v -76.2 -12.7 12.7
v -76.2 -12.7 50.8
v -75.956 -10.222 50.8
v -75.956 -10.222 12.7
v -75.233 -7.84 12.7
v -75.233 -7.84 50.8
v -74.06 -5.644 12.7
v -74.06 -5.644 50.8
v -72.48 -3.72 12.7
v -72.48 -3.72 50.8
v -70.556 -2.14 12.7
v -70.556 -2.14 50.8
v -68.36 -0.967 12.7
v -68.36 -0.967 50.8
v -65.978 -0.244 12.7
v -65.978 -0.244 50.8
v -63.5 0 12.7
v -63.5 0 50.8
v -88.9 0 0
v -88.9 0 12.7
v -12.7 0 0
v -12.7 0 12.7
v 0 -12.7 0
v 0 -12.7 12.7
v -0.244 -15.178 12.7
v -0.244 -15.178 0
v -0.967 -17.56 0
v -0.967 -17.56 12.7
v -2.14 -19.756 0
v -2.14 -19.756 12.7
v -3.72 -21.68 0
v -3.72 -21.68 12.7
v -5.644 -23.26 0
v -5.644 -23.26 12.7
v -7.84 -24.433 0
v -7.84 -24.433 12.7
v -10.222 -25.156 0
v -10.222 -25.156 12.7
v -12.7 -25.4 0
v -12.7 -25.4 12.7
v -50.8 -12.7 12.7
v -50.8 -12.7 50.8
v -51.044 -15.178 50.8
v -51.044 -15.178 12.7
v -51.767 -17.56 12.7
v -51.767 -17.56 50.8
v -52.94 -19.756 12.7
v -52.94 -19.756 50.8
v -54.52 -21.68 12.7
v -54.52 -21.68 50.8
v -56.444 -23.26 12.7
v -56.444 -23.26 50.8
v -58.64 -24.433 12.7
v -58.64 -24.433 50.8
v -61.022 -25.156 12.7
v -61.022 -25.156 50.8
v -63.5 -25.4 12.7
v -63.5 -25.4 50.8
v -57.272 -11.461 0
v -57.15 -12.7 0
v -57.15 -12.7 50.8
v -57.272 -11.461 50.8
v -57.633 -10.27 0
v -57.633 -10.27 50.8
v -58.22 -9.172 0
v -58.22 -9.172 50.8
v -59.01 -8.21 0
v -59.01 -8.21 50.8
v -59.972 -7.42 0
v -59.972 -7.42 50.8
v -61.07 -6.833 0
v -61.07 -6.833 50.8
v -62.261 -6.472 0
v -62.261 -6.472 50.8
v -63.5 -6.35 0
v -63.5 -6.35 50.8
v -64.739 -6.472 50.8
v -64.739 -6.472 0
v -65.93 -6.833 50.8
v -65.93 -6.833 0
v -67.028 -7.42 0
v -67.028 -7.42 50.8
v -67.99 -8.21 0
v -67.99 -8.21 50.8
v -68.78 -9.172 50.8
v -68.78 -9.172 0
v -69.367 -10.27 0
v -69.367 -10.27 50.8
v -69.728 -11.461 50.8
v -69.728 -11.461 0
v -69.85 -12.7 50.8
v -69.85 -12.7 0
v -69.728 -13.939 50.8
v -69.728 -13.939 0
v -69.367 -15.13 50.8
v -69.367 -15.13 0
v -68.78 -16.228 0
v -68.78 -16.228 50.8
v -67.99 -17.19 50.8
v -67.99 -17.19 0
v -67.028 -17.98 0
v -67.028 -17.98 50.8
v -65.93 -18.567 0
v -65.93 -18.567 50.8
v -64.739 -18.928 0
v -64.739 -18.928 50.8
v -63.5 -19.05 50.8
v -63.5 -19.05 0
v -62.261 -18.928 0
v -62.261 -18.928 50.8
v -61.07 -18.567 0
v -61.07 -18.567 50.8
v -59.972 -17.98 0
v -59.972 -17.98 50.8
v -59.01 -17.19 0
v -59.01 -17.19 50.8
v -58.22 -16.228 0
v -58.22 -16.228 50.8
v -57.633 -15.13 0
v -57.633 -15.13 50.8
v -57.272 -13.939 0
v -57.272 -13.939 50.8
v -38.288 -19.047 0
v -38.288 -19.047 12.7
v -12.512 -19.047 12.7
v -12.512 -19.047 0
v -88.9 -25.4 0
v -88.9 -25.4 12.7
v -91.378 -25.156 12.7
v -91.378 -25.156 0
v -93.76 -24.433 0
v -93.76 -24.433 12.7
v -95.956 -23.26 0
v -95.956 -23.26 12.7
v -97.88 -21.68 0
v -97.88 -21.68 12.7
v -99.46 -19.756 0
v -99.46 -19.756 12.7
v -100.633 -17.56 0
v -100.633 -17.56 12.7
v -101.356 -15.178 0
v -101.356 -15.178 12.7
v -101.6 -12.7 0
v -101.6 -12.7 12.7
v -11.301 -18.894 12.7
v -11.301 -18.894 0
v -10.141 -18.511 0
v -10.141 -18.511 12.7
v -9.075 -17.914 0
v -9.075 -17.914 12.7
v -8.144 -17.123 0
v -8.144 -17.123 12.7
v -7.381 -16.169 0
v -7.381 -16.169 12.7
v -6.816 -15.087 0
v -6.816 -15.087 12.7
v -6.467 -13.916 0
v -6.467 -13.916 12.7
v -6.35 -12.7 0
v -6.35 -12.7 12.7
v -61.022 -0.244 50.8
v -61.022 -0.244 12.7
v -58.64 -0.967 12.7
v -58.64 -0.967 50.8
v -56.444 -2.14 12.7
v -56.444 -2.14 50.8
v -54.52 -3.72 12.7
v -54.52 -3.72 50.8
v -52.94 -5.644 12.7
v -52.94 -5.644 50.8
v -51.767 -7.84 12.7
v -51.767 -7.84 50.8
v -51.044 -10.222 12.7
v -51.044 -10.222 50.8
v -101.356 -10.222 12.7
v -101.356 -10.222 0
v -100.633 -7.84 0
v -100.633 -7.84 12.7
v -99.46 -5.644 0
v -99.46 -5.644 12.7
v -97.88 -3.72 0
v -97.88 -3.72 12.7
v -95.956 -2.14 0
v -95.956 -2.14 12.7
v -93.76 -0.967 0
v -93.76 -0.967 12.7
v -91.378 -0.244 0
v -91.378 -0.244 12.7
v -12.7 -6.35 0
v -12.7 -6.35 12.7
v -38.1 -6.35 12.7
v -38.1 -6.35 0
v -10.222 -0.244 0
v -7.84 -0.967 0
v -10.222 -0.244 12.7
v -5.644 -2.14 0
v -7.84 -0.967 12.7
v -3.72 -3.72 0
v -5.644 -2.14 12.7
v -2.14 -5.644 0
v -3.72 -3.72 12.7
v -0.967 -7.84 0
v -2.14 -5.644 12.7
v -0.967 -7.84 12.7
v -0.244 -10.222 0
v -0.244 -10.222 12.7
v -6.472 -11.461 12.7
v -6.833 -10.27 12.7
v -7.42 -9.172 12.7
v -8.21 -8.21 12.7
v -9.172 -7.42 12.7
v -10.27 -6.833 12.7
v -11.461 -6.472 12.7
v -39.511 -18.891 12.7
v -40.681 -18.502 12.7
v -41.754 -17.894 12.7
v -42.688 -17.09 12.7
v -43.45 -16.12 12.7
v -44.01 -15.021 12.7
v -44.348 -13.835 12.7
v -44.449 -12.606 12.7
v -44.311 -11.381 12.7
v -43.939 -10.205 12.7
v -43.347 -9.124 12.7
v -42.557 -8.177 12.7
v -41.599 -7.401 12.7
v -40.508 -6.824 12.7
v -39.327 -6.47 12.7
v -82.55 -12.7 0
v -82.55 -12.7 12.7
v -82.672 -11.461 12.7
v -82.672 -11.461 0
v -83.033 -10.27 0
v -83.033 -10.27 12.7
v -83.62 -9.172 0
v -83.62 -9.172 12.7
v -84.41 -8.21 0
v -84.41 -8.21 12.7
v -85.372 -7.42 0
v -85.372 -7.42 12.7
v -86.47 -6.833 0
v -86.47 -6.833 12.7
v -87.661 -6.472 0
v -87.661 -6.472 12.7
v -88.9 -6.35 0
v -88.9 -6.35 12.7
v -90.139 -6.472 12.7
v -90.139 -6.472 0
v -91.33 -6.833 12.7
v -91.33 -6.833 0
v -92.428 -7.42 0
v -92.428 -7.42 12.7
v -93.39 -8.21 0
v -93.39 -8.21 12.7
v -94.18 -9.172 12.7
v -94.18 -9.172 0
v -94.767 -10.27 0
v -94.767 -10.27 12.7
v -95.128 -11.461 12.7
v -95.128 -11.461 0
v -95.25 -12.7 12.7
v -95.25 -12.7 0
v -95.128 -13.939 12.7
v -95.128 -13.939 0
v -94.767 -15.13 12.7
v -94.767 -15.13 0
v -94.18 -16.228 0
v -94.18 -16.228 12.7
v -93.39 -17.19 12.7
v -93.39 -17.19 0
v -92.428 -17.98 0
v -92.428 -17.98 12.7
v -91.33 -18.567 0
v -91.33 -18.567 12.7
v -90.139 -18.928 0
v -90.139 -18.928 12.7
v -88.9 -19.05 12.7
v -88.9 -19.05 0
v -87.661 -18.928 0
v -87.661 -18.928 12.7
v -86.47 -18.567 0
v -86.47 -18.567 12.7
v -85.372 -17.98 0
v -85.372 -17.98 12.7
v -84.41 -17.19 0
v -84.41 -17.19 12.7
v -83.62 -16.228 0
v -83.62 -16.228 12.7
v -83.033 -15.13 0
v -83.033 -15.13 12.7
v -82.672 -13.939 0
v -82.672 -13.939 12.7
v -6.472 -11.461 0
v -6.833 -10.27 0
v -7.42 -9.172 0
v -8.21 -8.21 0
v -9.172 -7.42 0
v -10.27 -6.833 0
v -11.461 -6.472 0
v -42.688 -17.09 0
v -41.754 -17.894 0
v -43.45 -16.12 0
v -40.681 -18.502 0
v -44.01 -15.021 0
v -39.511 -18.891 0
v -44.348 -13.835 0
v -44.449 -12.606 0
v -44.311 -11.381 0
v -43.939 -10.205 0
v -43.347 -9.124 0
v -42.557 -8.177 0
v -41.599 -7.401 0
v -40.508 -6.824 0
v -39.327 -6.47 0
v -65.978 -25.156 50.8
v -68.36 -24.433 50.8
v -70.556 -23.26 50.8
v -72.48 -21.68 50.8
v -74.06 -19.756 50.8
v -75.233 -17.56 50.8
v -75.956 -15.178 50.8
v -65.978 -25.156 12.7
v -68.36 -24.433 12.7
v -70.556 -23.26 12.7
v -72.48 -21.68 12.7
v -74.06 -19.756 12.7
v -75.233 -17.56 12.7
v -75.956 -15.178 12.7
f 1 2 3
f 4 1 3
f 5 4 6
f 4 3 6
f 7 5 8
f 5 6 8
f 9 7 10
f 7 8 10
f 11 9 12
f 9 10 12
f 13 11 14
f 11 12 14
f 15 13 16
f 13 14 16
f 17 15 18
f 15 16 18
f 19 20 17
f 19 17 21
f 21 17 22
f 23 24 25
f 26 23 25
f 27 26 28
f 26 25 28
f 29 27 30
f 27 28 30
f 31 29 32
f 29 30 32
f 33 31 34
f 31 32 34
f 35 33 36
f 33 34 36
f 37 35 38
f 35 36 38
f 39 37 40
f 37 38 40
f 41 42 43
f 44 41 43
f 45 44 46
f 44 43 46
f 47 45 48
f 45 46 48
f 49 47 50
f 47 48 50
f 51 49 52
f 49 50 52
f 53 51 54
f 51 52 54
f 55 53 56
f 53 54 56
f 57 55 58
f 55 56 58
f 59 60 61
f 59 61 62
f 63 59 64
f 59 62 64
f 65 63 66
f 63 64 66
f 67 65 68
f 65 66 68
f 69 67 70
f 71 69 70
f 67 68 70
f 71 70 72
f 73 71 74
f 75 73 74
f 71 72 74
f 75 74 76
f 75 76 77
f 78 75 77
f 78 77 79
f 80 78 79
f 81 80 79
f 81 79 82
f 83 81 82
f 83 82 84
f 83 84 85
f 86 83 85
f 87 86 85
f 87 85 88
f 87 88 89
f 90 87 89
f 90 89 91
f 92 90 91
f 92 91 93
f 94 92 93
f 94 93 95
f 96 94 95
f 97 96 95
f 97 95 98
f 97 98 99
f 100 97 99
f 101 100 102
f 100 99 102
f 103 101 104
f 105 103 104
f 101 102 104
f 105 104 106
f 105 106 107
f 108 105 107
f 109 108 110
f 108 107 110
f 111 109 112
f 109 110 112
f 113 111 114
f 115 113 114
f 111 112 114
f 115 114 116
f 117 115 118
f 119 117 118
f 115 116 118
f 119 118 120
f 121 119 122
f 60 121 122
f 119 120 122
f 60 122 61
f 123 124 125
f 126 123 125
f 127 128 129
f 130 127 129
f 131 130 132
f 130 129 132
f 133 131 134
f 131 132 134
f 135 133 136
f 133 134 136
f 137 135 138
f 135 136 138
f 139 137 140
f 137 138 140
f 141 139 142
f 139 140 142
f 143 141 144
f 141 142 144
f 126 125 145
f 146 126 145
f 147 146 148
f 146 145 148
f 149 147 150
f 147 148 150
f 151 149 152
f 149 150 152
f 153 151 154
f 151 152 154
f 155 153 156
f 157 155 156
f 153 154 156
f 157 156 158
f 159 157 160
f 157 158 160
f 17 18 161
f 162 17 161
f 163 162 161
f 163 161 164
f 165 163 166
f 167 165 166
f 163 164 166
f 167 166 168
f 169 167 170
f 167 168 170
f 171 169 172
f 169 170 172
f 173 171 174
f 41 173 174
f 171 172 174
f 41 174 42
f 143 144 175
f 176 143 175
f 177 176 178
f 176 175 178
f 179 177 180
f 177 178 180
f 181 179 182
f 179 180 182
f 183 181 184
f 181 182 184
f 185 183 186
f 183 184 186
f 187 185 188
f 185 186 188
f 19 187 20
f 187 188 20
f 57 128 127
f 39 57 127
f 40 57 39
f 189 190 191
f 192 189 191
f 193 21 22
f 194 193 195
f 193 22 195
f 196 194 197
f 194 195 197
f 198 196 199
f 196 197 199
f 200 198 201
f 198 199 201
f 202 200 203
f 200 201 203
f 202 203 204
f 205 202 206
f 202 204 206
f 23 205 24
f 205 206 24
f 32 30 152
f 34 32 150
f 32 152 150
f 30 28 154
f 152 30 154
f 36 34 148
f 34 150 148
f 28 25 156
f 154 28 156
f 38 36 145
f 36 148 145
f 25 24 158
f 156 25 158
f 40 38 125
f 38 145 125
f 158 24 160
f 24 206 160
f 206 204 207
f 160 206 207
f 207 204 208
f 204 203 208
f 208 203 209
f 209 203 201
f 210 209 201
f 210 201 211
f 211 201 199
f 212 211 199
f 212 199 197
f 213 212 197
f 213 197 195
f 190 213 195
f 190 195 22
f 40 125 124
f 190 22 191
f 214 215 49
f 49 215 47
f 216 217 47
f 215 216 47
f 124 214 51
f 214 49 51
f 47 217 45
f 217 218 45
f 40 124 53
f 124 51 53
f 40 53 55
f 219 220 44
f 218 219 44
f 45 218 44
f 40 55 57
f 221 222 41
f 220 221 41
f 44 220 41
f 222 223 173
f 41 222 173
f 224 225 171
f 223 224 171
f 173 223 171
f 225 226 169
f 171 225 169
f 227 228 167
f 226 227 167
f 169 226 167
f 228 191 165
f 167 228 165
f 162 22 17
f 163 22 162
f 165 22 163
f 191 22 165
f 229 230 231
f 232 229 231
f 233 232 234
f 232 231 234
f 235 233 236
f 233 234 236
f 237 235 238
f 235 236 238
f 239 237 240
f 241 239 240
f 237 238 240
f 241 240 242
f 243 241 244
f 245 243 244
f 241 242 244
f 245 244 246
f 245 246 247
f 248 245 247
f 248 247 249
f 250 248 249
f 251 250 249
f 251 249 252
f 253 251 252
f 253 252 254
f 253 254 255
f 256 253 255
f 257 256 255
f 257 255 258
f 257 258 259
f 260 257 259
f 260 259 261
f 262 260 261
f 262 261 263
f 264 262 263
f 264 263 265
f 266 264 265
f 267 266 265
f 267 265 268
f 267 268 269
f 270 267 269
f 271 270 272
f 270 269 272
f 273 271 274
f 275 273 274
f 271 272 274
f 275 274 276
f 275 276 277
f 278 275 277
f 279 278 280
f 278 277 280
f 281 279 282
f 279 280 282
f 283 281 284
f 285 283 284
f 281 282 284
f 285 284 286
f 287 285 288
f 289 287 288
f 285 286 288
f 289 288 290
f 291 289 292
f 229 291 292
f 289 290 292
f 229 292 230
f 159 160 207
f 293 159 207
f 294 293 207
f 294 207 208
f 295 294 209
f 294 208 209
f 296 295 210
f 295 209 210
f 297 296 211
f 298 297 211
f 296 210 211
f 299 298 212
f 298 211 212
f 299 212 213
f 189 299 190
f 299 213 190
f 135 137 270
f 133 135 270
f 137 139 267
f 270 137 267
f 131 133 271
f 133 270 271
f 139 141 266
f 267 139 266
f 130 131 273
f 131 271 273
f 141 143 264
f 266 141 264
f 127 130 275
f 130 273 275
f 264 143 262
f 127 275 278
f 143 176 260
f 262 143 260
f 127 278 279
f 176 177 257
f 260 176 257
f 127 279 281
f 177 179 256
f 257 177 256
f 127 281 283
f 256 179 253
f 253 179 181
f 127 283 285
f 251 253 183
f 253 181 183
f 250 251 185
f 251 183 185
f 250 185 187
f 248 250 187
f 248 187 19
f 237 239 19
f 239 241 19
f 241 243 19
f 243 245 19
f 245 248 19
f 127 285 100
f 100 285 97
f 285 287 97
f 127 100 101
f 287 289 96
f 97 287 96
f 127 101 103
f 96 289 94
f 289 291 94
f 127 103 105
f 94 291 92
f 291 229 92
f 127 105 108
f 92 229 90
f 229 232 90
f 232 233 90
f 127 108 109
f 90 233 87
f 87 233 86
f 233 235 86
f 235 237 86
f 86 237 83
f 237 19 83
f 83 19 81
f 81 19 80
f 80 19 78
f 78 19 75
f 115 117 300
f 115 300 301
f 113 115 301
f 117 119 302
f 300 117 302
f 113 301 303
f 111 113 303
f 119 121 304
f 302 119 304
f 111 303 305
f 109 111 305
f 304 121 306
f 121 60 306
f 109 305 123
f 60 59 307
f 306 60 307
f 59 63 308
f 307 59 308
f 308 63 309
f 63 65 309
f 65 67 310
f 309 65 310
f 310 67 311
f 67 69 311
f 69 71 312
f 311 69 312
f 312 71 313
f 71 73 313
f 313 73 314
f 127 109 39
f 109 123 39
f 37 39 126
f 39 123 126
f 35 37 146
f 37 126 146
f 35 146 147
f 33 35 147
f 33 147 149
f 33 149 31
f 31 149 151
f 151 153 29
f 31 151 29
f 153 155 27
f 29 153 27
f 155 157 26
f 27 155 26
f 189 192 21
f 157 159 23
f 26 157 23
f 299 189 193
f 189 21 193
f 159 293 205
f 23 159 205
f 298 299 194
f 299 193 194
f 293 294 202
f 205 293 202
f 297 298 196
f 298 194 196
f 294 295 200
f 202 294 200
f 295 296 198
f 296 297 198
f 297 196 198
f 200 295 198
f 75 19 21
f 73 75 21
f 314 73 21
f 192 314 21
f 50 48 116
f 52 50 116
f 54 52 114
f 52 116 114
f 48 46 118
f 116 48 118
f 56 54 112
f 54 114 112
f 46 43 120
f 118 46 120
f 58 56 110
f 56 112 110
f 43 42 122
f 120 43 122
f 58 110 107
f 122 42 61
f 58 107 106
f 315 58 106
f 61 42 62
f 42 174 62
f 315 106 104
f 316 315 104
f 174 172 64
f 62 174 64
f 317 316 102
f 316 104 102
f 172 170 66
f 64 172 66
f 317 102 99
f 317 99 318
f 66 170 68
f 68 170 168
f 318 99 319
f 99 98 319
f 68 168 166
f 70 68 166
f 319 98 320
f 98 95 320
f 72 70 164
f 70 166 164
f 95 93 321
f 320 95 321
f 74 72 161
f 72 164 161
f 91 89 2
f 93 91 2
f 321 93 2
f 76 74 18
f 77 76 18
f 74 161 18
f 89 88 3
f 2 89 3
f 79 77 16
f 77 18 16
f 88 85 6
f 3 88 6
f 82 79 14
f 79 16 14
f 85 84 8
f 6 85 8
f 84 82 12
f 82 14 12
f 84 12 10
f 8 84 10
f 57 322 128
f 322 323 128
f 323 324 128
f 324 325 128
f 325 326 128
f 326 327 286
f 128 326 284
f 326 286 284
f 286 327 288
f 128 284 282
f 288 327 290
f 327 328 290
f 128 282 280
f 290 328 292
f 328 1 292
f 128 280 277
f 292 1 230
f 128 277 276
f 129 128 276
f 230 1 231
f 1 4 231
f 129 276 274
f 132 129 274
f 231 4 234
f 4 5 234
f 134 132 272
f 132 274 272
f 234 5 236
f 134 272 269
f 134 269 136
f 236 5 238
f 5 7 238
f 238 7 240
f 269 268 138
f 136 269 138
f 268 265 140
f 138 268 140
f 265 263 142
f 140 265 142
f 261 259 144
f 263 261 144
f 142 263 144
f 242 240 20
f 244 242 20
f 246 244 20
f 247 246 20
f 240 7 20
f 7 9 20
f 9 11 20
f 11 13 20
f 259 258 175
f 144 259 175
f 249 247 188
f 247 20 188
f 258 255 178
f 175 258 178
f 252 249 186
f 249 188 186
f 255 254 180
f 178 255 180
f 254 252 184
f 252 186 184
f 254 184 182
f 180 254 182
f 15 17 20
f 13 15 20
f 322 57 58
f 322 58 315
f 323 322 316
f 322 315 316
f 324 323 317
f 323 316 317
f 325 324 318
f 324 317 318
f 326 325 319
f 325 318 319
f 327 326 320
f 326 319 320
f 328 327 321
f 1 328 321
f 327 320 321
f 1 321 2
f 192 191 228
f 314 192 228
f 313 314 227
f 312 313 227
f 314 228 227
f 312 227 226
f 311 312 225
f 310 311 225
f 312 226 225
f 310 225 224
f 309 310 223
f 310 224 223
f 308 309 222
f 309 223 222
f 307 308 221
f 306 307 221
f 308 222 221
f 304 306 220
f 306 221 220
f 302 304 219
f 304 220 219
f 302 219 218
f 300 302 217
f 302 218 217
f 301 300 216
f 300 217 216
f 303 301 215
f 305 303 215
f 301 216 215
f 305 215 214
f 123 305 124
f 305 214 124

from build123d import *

# Parameters (mm, degrees)
F1_DEPTH  = 25.4
F3_DEPTH  = 38.1
F4_R      = 6.35
F5_DEPTH  = 63.5
F6_R      = 6.35
F7_DEPTH  = 25.4
F9_DEPTH  = 25.4
F11_DEPTH = 25.4
F13_DEPTH = 25.4


with BuildPart() as f1:
    # F0 (on Front) → F1 (new body)
    with BuildSketch(Plane.XZ):
        Polygon((-101.6, 0), (0, 0), (0, 12.7), (-50.8, 12.7), (-50.8, 50.8), (-76.2, 50.8), (-76.2, 12.7), (-101.6, 12.7), align=None)
    extrude(amount=F1_DEPTH)

    # F2 (on face) → F3 (cut)
    with BuildSketch(Plane.XY.offset(50.8)):
        with BuildLine():
            ThreePointArc((-63.5, 0), (-54.5197438789, -3.7197438789), (-50.8, -12.7))
            Line((-50.8, -12.7), (-50.8, 0))
            Line((-50.8, 0), (-63.5, 0))
        make_face()
        with BuildLine():
            ThreePointArc((-76.2, -12.7), (-72.4802561211, -3.7197438789), (-63.5, 0))
            Line((-63.5, 0), (-76.2, 0))
            Line((-76.2, 0), (-76.2, -12.7))
        make_face()
        with BuildLine():
            Line((-76.2, -25.4), (-63.5, -25.4))
            ThreePointArc((-63.5, -25.4), (-72.4802561211, -21.6802561211), (-76.2, -12.7))
            Line((-76.2, -12.7), (-76.2, -25.4))
        make_face()
        with BuildLine():
            Line((-50.8, -25.4), (-50.8, -12.7))
            ThreePointArc((-50.8, -12.7), (-54.5197438789, -21.6802561211), (-63.5, -25.4))
            Line((-63.5, -25.4), (-50.8, -25.4))
        make_face()
    extrude(amount=-F3_DEPTH, mode=Mode.SUBTRACT)

    # F4 (on face) → F5 (cut)
    with BuildSketch(Plane.XY.offset(50.8)):
        with Locations((-63.5, -12.7)):
            Circle(F4_R)
    extrude(amount=-F5_DEPTH, mode=Mode.SUBTRACT)

    # F6 (on face) → F7 (cut)
    with BuildSketch(Plane.XY.offset(12.7)):
        with Locations((-88.9, -12.7)):
            Circle(F6_R)
    extrude(amount=-F7_DEPTH, mode=Mode.SUBTRACT)

    # F8 (on face) → F9 (cut)
    with BuildSketch(Plane.XY.offset(12.7)):
        with BuildLine():
            ThreePointArc((-101.6, -12.7), (-97.8802561211, -3.7197438789), (-88.9, 0))
            Line((-88.9, 0), (-101.6, 0))
            Line((-101.6, 0), (-101.6, -12.7))
        make_face()
        with BuildLine():
            Line((-101.6, -25.4), (-88.9, -25.4))
            ThreePointArc((-88.9, -25.4), (-97.8802561211, -21.6802561211), (-101.6, -12.7))
            Line((-101.6, -12.7), (-101.6, -25.4))
        make_face()
    extrude(amount=-F9_DEPTH, mode=Mode.SUBTRACT)

    # F10 (on face) → F11 (cut)
    with BuildSketch(Plane.XY.offset(12.7)):
        with BuildLine():
            ThreePointArc((-37.9124571555, -19.0472299219), (-33.5440480104, -17.1233247076), (-31.75, -12.7))
            ThreePointArc((-31.75, -12.7), (-33.6098719395, -8.2098719395), (-38.1, -6.35))
            ThreePointArc((-38.1, -6.35), (-44.4493074427, -12.6062183495), (-38.2875428445, -19.0472299219))
            Line((-38.2875428445, -19.0472299219), (-37.9124571555, -19.0472299219))
        make_face()
        with BuildLine():
            ThreePointArc((-38.1, -6.35), (-33.6098719395, -8.2098719395), (-31.75, -12.7))
            ThreePointArc((-31.75, -12.7), (-33.5440480104, -17.1233247076), (-37.9124571555, -19.0472299219))
            Line((-37.9124571555, -19.0472299219), (-12.8875428445, -19.0472299219))
            ThreePointArc((-12.8875428445, -19.0472299219), (-19.0493074427, -12.6062183495), (-12.7, -6.35))
            Line((-12.7, -6.35), (-38.1, -6.35))
        make_face()
        with BuildLine():
            ThreePointArc((-6.35, -12.7), (-8.2098719395, -8.2098719395), (-12.7, -6.35))
            ThreePointArc((-12.7, -6.35), (-19.0493074427, -12.6062183495), (-12.8875428445, -19.0472299219))
            Line((-12.8875428445, -19.0472299219), (-12.5124571555, -19.0472299219))
            ThreePointArc((-12.5124571555, -19.0472299219), (-8.1440480104, -17.1233247076), (-6.35, -12.7))
        make_face()
    extrude(amount=-F11_DEPTH, mode=Mode.SUBTRACT)

    # F12 (on face) → F13 (cut)
    with BuildSketch(Plane.XY.offset(12.7)):
        with BuildLine():
            ThreePointArc((-12.7, 0), (-3.7197438789, -3.7197438789), (0, -12.7))
            Line((0, -12.7), (0, 0))
            Line((0, 0), (-12.7, 0))
        make_face()
        with BuildLine():
            Line((0, -25.4), (0, -12.7))
            ThreePointArc((0, -12.7), (-3.7197438896, -21.6802561317), (-12.7000000301, -25.4))
            Line((-12.7000000301, -25.4), (0, -25.4))
        make_face()
    extrude(amount=-F13_DEPTH, mode=Mode.SUBTRACT)


solid = f1.part
